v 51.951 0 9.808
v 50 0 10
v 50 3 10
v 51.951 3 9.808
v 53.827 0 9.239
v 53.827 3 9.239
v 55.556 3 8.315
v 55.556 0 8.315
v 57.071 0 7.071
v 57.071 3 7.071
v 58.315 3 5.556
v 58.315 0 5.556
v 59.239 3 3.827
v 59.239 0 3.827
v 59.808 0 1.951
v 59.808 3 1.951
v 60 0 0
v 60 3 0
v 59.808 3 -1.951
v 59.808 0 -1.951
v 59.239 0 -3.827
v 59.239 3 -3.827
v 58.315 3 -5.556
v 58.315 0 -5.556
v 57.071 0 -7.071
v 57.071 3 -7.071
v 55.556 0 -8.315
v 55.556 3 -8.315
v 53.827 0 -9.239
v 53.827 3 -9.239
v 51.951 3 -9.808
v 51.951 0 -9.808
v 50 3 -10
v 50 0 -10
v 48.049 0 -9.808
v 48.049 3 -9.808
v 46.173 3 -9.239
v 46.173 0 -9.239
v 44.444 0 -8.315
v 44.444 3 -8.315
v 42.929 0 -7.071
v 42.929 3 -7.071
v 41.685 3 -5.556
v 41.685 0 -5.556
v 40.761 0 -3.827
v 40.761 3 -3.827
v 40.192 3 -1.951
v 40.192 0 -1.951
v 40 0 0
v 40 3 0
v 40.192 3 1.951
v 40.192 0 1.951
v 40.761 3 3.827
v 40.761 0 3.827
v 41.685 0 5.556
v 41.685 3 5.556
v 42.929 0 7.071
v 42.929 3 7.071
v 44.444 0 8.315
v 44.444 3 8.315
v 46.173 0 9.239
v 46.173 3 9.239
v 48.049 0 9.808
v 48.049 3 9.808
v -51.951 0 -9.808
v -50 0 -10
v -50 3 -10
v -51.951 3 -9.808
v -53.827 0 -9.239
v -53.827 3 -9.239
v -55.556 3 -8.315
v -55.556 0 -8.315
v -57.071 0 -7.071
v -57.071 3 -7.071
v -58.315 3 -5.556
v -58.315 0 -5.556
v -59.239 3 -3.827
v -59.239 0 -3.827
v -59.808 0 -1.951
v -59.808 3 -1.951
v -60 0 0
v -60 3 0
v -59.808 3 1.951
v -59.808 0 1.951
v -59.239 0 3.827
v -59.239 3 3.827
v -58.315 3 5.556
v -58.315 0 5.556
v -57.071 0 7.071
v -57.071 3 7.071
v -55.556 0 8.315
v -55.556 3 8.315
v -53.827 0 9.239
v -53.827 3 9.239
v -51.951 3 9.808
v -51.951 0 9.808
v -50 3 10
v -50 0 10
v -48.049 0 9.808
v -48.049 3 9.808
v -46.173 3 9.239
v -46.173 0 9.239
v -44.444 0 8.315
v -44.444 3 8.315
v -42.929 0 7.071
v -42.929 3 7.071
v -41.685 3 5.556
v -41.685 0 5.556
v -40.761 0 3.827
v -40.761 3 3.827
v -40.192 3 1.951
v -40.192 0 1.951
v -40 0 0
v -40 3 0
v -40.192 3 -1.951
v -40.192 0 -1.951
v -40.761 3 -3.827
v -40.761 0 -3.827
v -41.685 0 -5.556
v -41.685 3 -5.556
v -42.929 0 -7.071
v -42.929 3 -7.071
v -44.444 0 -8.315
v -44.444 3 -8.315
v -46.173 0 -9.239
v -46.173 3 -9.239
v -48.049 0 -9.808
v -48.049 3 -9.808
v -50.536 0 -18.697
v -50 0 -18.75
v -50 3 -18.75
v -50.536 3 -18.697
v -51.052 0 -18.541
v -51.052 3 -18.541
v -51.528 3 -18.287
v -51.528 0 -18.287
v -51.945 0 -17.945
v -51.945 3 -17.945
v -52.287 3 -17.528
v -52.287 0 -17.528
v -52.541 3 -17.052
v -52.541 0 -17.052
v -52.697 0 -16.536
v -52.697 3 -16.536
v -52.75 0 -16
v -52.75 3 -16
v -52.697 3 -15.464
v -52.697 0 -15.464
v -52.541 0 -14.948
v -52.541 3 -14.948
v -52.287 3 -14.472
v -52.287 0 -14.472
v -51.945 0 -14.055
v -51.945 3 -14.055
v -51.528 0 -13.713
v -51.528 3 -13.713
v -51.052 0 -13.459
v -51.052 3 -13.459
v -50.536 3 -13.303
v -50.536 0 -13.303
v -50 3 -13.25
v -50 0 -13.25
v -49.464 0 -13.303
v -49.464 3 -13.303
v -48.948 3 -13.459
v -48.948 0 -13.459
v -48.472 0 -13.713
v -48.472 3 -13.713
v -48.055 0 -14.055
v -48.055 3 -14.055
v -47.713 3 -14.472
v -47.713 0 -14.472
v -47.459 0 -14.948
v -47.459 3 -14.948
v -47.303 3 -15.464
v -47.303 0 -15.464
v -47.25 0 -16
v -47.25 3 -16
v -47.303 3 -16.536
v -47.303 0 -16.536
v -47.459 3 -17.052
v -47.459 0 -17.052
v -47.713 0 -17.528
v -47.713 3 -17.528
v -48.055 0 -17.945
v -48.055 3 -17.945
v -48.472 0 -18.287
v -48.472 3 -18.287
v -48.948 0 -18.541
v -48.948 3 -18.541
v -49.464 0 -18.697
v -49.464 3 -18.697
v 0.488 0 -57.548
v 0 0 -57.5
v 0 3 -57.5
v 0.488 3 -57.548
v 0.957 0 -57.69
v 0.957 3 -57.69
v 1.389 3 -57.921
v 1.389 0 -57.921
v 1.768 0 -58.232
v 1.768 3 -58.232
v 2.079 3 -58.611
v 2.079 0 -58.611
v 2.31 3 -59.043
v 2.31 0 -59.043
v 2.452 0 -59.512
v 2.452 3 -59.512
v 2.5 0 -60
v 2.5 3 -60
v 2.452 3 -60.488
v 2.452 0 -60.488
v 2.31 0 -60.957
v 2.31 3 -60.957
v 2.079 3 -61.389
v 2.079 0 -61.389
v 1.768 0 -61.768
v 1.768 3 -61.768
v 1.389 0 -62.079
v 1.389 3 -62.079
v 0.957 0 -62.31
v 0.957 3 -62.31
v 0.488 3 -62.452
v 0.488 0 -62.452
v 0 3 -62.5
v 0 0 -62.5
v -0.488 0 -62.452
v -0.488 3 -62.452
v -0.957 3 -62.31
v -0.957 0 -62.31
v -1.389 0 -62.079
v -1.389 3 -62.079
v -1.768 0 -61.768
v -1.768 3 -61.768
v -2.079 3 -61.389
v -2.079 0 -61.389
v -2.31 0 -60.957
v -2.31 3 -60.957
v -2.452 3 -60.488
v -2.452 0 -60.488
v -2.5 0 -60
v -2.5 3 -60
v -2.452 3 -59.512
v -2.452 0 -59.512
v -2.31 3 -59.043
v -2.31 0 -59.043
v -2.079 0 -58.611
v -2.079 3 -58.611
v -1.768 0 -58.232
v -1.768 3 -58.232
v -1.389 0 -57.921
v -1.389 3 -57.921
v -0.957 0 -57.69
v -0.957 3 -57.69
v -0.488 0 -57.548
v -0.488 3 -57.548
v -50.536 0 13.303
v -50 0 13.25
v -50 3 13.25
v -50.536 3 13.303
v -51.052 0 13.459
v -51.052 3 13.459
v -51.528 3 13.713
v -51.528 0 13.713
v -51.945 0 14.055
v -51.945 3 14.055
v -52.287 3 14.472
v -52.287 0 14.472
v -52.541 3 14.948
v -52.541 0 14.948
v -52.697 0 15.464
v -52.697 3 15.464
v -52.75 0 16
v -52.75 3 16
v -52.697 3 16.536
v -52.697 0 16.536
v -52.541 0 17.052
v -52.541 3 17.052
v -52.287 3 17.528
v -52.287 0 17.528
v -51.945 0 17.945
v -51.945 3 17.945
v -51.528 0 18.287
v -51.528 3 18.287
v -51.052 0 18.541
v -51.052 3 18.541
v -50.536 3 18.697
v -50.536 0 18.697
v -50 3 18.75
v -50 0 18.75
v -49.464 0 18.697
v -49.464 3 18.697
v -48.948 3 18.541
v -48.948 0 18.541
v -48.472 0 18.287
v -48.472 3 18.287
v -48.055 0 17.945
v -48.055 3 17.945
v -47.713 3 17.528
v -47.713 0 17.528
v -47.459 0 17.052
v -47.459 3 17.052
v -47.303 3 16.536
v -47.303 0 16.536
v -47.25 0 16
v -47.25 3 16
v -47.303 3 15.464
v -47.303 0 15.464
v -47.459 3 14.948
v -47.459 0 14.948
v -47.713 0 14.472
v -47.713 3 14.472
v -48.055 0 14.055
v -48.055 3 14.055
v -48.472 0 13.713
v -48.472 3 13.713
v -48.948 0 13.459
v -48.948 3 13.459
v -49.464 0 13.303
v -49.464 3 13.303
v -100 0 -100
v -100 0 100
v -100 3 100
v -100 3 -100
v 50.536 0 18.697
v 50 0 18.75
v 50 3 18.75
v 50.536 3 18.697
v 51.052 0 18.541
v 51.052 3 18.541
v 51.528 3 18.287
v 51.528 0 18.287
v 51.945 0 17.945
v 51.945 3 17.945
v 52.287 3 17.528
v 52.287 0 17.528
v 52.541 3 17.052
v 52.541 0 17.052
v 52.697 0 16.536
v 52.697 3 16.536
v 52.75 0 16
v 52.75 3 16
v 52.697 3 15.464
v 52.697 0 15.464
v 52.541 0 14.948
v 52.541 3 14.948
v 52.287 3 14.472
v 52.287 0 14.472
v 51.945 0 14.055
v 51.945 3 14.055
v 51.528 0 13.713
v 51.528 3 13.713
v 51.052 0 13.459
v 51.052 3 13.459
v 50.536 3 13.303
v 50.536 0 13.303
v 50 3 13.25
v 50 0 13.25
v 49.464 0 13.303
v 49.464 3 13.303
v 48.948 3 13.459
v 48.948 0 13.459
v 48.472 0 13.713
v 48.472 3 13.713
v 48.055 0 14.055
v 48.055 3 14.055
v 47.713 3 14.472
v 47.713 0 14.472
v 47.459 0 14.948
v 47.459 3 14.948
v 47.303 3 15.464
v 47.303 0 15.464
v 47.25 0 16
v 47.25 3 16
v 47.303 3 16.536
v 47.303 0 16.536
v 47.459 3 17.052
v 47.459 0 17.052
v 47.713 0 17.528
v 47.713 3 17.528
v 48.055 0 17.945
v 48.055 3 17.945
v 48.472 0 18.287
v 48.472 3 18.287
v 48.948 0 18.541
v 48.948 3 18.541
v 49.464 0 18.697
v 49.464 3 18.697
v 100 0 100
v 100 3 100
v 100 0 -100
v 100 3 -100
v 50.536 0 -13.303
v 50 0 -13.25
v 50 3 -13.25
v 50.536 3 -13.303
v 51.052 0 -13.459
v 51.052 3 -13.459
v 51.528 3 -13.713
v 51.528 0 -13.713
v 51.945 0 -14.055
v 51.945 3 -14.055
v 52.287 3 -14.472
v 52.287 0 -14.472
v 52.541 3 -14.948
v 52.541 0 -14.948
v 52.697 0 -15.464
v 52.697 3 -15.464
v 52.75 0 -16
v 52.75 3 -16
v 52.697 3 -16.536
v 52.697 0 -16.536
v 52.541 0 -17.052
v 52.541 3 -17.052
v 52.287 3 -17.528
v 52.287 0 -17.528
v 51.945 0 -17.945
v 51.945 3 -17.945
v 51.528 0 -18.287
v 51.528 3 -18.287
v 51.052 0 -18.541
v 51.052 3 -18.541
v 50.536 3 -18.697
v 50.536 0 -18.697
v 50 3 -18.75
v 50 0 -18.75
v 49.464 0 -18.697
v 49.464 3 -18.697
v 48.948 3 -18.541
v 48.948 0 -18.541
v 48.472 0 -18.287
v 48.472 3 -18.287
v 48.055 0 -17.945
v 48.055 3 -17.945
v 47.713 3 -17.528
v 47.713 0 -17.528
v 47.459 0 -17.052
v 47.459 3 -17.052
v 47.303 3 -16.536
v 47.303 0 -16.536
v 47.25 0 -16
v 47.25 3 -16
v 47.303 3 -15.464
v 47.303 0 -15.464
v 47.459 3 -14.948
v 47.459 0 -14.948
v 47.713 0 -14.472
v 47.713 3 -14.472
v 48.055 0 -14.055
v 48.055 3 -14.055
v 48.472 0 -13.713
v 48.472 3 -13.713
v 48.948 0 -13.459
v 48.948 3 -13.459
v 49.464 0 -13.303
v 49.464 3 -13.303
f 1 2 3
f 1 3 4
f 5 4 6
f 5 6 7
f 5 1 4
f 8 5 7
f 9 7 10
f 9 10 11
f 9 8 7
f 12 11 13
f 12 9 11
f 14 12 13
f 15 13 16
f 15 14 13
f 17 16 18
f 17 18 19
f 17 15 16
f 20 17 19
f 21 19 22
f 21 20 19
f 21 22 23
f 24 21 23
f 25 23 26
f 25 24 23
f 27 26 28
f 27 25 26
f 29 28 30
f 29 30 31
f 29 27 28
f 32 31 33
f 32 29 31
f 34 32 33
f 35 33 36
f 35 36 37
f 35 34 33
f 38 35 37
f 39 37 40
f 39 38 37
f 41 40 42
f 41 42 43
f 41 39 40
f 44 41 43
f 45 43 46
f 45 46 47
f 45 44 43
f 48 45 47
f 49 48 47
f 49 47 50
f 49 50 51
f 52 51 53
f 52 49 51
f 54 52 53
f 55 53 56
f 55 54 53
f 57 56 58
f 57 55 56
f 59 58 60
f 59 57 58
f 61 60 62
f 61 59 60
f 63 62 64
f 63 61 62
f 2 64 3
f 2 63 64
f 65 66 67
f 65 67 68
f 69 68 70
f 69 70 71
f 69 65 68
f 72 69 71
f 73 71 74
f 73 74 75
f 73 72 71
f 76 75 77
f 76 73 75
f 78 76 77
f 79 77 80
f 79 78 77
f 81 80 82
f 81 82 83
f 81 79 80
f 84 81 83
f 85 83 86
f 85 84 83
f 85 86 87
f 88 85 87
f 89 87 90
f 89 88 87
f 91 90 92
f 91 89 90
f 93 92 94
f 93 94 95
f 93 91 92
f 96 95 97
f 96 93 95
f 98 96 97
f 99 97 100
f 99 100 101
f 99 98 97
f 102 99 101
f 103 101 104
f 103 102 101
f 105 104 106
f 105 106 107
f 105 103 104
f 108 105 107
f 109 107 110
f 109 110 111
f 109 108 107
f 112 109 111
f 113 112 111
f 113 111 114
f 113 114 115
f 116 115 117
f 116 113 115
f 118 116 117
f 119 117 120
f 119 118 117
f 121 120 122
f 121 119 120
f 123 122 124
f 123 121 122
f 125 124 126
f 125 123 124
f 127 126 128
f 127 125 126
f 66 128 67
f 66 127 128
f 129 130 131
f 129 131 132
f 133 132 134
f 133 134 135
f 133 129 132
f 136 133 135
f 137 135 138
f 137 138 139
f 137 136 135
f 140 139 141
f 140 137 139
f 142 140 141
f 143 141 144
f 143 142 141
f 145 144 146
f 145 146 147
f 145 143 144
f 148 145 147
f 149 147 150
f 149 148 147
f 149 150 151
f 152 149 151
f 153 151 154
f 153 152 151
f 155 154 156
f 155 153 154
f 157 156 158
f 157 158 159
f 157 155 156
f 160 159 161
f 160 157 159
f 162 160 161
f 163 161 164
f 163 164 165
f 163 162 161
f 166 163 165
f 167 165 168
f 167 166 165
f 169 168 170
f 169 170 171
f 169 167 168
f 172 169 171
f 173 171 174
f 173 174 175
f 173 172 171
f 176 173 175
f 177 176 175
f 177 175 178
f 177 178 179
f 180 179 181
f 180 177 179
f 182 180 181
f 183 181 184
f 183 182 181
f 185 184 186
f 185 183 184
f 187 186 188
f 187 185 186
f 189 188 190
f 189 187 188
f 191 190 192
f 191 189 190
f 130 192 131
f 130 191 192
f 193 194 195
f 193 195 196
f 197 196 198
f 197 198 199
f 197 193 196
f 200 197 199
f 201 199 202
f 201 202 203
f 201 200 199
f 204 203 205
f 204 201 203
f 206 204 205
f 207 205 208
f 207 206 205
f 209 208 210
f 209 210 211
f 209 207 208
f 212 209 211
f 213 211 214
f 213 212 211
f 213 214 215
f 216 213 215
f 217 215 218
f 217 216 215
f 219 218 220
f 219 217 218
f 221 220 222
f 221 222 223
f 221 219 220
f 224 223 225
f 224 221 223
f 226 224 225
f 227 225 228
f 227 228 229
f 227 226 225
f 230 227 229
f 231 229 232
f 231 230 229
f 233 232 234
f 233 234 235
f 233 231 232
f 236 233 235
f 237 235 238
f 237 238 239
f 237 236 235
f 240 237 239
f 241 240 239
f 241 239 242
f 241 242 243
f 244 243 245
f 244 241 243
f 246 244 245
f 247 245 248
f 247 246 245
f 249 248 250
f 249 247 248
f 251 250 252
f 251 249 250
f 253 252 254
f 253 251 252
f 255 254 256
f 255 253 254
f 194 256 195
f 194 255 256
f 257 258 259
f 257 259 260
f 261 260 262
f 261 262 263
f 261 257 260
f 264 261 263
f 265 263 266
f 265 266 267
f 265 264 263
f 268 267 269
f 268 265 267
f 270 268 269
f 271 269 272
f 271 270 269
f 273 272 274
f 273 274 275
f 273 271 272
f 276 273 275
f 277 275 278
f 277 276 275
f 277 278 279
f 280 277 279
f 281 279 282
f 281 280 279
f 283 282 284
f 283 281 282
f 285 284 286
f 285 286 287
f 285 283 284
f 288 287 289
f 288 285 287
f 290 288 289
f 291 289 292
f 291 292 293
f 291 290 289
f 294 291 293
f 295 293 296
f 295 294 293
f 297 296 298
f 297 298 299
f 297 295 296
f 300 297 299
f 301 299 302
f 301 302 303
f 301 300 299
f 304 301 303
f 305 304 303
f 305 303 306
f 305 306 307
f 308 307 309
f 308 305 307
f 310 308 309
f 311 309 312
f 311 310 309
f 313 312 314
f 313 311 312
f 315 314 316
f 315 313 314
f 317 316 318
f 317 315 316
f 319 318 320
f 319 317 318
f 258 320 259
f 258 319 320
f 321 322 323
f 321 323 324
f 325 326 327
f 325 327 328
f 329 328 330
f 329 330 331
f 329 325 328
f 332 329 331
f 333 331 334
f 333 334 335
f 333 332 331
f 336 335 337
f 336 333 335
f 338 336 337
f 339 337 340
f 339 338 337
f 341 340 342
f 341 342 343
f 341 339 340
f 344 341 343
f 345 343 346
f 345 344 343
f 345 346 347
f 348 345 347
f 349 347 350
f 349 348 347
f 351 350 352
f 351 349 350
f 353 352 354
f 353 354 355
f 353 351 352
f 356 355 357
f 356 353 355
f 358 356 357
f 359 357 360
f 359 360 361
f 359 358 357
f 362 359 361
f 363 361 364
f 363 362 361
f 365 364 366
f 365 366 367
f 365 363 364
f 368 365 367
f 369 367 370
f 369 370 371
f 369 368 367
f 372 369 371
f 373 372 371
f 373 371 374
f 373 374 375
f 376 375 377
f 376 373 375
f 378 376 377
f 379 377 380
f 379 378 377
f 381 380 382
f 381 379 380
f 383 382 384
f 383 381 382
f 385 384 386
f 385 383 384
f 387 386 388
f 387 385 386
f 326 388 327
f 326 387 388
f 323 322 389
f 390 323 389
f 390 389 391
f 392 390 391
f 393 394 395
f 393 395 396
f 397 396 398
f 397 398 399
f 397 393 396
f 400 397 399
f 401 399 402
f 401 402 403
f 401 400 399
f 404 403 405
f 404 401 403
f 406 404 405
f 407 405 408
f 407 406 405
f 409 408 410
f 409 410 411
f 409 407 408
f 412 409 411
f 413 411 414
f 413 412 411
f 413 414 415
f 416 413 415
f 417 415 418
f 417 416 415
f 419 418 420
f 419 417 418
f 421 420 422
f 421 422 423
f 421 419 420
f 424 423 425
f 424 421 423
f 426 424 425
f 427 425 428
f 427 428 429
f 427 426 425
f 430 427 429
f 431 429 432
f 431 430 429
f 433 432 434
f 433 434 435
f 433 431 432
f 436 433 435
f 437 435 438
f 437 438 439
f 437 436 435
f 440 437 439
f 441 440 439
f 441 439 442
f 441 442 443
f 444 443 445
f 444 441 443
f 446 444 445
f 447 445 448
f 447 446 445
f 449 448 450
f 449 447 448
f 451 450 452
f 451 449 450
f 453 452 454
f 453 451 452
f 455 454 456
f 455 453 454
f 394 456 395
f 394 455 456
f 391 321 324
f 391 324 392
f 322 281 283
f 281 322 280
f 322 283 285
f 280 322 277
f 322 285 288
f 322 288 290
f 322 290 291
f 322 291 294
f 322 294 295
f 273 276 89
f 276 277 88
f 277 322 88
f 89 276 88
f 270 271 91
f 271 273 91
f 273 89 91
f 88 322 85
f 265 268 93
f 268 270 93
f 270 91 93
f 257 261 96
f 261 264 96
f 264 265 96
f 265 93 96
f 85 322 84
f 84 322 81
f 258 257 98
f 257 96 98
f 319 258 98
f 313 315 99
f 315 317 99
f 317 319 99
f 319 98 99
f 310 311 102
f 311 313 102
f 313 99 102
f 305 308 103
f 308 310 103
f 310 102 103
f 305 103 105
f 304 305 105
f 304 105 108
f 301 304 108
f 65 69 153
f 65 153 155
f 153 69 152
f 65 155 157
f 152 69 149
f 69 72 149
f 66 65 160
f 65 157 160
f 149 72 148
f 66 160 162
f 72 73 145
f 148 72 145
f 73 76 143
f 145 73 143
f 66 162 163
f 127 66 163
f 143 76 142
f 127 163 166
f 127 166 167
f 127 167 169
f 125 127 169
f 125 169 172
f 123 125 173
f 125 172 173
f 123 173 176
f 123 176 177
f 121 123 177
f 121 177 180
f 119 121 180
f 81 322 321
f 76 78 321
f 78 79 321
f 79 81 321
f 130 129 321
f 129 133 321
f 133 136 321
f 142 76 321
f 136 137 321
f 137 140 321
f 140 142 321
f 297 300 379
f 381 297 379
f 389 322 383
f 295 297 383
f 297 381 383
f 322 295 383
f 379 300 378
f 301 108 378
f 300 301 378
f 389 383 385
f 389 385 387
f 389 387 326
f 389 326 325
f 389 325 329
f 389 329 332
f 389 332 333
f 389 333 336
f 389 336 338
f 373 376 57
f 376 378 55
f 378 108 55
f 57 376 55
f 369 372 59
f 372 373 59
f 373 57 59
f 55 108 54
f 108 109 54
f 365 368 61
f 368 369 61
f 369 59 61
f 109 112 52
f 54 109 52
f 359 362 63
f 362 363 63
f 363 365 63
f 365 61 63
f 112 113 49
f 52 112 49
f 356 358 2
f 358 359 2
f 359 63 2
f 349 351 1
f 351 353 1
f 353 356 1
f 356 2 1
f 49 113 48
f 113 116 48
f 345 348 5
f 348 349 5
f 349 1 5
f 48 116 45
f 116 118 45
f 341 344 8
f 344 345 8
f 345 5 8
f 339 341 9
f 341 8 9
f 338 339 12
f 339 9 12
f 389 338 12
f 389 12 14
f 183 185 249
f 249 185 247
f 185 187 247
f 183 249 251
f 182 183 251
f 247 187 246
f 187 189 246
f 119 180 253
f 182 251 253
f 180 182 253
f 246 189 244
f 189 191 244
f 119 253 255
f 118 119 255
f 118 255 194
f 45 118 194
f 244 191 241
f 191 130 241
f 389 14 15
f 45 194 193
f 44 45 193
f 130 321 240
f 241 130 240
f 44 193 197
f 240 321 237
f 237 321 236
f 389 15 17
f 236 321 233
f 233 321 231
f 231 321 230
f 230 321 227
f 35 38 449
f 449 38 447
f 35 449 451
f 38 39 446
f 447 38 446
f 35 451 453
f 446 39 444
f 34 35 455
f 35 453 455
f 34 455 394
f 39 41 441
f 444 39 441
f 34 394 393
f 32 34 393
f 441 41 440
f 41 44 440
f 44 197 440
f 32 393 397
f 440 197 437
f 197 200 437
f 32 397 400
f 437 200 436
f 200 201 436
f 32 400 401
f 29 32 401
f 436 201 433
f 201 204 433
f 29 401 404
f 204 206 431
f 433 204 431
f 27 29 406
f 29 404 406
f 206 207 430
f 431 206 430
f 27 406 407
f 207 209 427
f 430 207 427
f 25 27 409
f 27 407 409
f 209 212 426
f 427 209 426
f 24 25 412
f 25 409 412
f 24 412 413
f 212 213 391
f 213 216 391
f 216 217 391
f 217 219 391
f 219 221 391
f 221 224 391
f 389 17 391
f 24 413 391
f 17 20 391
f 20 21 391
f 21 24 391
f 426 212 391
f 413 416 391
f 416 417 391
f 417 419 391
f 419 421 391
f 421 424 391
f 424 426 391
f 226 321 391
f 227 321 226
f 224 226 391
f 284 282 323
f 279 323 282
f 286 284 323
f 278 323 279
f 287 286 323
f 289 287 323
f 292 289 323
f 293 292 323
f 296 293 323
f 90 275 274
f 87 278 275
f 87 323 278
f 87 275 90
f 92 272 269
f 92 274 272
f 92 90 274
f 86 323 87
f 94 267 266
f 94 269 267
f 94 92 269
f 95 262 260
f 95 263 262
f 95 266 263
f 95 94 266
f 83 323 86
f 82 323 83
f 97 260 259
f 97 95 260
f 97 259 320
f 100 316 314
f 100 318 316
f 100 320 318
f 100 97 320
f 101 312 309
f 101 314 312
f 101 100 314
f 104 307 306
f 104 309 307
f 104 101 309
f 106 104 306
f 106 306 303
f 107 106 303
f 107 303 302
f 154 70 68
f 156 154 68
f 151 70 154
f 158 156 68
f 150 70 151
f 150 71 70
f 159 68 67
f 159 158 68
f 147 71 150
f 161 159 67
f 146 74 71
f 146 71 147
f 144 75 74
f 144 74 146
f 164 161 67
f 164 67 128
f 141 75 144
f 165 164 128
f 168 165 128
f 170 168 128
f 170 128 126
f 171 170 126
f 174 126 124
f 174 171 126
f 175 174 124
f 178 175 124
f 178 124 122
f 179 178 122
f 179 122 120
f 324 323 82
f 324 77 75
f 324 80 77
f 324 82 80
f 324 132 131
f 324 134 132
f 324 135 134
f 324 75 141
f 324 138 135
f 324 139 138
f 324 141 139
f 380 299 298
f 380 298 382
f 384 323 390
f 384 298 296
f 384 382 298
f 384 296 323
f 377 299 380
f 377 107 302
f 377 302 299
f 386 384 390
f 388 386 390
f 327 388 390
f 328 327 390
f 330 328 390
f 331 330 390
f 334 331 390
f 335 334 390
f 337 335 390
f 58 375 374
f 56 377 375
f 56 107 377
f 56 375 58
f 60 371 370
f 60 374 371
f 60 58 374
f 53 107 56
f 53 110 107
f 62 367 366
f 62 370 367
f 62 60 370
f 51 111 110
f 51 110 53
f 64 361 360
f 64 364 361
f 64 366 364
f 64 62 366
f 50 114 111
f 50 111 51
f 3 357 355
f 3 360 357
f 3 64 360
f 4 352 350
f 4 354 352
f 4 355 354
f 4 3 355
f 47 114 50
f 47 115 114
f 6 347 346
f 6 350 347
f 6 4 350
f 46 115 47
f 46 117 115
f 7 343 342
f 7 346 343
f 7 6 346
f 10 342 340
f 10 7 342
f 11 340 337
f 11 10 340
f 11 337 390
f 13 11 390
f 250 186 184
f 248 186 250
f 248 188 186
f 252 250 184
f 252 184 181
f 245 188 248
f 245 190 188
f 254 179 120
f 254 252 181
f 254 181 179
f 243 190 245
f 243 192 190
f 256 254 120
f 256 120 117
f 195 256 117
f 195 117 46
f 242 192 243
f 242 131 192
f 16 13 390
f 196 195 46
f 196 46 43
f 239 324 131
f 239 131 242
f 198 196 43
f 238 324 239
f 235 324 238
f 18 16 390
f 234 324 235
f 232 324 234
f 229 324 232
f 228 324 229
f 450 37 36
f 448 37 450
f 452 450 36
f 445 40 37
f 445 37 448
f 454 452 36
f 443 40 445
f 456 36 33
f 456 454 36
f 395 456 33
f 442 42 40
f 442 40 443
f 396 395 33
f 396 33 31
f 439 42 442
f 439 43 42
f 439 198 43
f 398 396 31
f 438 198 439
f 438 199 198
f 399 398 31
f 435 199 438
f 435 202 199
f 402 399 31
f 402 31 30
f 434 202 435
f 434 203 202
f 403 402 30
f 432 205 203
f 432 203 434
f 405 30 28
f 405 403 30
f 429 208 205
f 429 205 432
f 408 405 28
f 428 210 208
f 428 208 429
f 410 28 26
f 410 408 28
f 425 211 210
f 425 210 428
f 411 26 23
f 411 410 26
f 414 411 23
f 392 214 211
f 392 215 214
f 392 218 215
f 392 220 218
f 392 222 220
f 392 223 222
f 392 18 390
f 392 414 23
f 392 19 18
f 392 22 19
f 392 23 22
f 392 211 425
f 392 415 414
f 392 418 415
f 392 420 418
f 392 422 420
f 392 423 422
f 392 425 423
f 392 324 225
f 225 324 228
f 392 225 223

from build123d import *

# Parameters (mm, degrees)
SKETCH_1_W      = 200
SKETCH_1_H      = 200
SKETCH_1_R      = 2.5
SKETCH_1_R_2    = 10
SKETCH_1_R_3    = 2.75
EXTRUDE_1_DEPTH = 3


with BuildPart() as part:
    # 草图1 → 凸台-拉伸1 (new body)
    with BuildSketch(Plane(origin=(0, 0, 0), x_dir=(1, 0, 0), z_dir=(0, 1, 0))):
        Rectangle(SKETCH_1_W, SKETCH_1_H)
        with Locations(Location((0, 60, 0), (0, 0, 270))):
            Circle(SKETCH_1_R, mode=Mode.SUBTRACT)
        with Locations(Location((50, 0, 0), (0, 0, 270))):
            Circle(SKETCH_1_R_2, mode=Mode.SUBTRACT)
        with Locations(Location((50, 16, 0), (0, 0, 270))):
            Circle(SKETCH_1_R_3, mode=Mode.SUBTRACT)
        with Locations(Location((50, -16, 0), (0, 0, 270))):
            Circle(SKETCH_1_R_3, mode=Mode.SUBTRACT)
        with Locations(Location((-50, -16, 0), (0, 0, 90))):
            Circle(SKETCH_1_R_3, mode=Mode.SUBTRACT)
        with Locations(Location((-50, 16, 0), (0, 0, 90))):
            Circle(SKETCH_1_R_3, mode=Mode.SUBTRACT)
        with Locations(Location((-50, 0, 0), (0, 0, 90))):
            Circle(SKETCH_1_R_2, mode=Mode.SUBTRACT)
    extrude(amount=EXTRUDE_1_DEPTH)


solid = part.part
